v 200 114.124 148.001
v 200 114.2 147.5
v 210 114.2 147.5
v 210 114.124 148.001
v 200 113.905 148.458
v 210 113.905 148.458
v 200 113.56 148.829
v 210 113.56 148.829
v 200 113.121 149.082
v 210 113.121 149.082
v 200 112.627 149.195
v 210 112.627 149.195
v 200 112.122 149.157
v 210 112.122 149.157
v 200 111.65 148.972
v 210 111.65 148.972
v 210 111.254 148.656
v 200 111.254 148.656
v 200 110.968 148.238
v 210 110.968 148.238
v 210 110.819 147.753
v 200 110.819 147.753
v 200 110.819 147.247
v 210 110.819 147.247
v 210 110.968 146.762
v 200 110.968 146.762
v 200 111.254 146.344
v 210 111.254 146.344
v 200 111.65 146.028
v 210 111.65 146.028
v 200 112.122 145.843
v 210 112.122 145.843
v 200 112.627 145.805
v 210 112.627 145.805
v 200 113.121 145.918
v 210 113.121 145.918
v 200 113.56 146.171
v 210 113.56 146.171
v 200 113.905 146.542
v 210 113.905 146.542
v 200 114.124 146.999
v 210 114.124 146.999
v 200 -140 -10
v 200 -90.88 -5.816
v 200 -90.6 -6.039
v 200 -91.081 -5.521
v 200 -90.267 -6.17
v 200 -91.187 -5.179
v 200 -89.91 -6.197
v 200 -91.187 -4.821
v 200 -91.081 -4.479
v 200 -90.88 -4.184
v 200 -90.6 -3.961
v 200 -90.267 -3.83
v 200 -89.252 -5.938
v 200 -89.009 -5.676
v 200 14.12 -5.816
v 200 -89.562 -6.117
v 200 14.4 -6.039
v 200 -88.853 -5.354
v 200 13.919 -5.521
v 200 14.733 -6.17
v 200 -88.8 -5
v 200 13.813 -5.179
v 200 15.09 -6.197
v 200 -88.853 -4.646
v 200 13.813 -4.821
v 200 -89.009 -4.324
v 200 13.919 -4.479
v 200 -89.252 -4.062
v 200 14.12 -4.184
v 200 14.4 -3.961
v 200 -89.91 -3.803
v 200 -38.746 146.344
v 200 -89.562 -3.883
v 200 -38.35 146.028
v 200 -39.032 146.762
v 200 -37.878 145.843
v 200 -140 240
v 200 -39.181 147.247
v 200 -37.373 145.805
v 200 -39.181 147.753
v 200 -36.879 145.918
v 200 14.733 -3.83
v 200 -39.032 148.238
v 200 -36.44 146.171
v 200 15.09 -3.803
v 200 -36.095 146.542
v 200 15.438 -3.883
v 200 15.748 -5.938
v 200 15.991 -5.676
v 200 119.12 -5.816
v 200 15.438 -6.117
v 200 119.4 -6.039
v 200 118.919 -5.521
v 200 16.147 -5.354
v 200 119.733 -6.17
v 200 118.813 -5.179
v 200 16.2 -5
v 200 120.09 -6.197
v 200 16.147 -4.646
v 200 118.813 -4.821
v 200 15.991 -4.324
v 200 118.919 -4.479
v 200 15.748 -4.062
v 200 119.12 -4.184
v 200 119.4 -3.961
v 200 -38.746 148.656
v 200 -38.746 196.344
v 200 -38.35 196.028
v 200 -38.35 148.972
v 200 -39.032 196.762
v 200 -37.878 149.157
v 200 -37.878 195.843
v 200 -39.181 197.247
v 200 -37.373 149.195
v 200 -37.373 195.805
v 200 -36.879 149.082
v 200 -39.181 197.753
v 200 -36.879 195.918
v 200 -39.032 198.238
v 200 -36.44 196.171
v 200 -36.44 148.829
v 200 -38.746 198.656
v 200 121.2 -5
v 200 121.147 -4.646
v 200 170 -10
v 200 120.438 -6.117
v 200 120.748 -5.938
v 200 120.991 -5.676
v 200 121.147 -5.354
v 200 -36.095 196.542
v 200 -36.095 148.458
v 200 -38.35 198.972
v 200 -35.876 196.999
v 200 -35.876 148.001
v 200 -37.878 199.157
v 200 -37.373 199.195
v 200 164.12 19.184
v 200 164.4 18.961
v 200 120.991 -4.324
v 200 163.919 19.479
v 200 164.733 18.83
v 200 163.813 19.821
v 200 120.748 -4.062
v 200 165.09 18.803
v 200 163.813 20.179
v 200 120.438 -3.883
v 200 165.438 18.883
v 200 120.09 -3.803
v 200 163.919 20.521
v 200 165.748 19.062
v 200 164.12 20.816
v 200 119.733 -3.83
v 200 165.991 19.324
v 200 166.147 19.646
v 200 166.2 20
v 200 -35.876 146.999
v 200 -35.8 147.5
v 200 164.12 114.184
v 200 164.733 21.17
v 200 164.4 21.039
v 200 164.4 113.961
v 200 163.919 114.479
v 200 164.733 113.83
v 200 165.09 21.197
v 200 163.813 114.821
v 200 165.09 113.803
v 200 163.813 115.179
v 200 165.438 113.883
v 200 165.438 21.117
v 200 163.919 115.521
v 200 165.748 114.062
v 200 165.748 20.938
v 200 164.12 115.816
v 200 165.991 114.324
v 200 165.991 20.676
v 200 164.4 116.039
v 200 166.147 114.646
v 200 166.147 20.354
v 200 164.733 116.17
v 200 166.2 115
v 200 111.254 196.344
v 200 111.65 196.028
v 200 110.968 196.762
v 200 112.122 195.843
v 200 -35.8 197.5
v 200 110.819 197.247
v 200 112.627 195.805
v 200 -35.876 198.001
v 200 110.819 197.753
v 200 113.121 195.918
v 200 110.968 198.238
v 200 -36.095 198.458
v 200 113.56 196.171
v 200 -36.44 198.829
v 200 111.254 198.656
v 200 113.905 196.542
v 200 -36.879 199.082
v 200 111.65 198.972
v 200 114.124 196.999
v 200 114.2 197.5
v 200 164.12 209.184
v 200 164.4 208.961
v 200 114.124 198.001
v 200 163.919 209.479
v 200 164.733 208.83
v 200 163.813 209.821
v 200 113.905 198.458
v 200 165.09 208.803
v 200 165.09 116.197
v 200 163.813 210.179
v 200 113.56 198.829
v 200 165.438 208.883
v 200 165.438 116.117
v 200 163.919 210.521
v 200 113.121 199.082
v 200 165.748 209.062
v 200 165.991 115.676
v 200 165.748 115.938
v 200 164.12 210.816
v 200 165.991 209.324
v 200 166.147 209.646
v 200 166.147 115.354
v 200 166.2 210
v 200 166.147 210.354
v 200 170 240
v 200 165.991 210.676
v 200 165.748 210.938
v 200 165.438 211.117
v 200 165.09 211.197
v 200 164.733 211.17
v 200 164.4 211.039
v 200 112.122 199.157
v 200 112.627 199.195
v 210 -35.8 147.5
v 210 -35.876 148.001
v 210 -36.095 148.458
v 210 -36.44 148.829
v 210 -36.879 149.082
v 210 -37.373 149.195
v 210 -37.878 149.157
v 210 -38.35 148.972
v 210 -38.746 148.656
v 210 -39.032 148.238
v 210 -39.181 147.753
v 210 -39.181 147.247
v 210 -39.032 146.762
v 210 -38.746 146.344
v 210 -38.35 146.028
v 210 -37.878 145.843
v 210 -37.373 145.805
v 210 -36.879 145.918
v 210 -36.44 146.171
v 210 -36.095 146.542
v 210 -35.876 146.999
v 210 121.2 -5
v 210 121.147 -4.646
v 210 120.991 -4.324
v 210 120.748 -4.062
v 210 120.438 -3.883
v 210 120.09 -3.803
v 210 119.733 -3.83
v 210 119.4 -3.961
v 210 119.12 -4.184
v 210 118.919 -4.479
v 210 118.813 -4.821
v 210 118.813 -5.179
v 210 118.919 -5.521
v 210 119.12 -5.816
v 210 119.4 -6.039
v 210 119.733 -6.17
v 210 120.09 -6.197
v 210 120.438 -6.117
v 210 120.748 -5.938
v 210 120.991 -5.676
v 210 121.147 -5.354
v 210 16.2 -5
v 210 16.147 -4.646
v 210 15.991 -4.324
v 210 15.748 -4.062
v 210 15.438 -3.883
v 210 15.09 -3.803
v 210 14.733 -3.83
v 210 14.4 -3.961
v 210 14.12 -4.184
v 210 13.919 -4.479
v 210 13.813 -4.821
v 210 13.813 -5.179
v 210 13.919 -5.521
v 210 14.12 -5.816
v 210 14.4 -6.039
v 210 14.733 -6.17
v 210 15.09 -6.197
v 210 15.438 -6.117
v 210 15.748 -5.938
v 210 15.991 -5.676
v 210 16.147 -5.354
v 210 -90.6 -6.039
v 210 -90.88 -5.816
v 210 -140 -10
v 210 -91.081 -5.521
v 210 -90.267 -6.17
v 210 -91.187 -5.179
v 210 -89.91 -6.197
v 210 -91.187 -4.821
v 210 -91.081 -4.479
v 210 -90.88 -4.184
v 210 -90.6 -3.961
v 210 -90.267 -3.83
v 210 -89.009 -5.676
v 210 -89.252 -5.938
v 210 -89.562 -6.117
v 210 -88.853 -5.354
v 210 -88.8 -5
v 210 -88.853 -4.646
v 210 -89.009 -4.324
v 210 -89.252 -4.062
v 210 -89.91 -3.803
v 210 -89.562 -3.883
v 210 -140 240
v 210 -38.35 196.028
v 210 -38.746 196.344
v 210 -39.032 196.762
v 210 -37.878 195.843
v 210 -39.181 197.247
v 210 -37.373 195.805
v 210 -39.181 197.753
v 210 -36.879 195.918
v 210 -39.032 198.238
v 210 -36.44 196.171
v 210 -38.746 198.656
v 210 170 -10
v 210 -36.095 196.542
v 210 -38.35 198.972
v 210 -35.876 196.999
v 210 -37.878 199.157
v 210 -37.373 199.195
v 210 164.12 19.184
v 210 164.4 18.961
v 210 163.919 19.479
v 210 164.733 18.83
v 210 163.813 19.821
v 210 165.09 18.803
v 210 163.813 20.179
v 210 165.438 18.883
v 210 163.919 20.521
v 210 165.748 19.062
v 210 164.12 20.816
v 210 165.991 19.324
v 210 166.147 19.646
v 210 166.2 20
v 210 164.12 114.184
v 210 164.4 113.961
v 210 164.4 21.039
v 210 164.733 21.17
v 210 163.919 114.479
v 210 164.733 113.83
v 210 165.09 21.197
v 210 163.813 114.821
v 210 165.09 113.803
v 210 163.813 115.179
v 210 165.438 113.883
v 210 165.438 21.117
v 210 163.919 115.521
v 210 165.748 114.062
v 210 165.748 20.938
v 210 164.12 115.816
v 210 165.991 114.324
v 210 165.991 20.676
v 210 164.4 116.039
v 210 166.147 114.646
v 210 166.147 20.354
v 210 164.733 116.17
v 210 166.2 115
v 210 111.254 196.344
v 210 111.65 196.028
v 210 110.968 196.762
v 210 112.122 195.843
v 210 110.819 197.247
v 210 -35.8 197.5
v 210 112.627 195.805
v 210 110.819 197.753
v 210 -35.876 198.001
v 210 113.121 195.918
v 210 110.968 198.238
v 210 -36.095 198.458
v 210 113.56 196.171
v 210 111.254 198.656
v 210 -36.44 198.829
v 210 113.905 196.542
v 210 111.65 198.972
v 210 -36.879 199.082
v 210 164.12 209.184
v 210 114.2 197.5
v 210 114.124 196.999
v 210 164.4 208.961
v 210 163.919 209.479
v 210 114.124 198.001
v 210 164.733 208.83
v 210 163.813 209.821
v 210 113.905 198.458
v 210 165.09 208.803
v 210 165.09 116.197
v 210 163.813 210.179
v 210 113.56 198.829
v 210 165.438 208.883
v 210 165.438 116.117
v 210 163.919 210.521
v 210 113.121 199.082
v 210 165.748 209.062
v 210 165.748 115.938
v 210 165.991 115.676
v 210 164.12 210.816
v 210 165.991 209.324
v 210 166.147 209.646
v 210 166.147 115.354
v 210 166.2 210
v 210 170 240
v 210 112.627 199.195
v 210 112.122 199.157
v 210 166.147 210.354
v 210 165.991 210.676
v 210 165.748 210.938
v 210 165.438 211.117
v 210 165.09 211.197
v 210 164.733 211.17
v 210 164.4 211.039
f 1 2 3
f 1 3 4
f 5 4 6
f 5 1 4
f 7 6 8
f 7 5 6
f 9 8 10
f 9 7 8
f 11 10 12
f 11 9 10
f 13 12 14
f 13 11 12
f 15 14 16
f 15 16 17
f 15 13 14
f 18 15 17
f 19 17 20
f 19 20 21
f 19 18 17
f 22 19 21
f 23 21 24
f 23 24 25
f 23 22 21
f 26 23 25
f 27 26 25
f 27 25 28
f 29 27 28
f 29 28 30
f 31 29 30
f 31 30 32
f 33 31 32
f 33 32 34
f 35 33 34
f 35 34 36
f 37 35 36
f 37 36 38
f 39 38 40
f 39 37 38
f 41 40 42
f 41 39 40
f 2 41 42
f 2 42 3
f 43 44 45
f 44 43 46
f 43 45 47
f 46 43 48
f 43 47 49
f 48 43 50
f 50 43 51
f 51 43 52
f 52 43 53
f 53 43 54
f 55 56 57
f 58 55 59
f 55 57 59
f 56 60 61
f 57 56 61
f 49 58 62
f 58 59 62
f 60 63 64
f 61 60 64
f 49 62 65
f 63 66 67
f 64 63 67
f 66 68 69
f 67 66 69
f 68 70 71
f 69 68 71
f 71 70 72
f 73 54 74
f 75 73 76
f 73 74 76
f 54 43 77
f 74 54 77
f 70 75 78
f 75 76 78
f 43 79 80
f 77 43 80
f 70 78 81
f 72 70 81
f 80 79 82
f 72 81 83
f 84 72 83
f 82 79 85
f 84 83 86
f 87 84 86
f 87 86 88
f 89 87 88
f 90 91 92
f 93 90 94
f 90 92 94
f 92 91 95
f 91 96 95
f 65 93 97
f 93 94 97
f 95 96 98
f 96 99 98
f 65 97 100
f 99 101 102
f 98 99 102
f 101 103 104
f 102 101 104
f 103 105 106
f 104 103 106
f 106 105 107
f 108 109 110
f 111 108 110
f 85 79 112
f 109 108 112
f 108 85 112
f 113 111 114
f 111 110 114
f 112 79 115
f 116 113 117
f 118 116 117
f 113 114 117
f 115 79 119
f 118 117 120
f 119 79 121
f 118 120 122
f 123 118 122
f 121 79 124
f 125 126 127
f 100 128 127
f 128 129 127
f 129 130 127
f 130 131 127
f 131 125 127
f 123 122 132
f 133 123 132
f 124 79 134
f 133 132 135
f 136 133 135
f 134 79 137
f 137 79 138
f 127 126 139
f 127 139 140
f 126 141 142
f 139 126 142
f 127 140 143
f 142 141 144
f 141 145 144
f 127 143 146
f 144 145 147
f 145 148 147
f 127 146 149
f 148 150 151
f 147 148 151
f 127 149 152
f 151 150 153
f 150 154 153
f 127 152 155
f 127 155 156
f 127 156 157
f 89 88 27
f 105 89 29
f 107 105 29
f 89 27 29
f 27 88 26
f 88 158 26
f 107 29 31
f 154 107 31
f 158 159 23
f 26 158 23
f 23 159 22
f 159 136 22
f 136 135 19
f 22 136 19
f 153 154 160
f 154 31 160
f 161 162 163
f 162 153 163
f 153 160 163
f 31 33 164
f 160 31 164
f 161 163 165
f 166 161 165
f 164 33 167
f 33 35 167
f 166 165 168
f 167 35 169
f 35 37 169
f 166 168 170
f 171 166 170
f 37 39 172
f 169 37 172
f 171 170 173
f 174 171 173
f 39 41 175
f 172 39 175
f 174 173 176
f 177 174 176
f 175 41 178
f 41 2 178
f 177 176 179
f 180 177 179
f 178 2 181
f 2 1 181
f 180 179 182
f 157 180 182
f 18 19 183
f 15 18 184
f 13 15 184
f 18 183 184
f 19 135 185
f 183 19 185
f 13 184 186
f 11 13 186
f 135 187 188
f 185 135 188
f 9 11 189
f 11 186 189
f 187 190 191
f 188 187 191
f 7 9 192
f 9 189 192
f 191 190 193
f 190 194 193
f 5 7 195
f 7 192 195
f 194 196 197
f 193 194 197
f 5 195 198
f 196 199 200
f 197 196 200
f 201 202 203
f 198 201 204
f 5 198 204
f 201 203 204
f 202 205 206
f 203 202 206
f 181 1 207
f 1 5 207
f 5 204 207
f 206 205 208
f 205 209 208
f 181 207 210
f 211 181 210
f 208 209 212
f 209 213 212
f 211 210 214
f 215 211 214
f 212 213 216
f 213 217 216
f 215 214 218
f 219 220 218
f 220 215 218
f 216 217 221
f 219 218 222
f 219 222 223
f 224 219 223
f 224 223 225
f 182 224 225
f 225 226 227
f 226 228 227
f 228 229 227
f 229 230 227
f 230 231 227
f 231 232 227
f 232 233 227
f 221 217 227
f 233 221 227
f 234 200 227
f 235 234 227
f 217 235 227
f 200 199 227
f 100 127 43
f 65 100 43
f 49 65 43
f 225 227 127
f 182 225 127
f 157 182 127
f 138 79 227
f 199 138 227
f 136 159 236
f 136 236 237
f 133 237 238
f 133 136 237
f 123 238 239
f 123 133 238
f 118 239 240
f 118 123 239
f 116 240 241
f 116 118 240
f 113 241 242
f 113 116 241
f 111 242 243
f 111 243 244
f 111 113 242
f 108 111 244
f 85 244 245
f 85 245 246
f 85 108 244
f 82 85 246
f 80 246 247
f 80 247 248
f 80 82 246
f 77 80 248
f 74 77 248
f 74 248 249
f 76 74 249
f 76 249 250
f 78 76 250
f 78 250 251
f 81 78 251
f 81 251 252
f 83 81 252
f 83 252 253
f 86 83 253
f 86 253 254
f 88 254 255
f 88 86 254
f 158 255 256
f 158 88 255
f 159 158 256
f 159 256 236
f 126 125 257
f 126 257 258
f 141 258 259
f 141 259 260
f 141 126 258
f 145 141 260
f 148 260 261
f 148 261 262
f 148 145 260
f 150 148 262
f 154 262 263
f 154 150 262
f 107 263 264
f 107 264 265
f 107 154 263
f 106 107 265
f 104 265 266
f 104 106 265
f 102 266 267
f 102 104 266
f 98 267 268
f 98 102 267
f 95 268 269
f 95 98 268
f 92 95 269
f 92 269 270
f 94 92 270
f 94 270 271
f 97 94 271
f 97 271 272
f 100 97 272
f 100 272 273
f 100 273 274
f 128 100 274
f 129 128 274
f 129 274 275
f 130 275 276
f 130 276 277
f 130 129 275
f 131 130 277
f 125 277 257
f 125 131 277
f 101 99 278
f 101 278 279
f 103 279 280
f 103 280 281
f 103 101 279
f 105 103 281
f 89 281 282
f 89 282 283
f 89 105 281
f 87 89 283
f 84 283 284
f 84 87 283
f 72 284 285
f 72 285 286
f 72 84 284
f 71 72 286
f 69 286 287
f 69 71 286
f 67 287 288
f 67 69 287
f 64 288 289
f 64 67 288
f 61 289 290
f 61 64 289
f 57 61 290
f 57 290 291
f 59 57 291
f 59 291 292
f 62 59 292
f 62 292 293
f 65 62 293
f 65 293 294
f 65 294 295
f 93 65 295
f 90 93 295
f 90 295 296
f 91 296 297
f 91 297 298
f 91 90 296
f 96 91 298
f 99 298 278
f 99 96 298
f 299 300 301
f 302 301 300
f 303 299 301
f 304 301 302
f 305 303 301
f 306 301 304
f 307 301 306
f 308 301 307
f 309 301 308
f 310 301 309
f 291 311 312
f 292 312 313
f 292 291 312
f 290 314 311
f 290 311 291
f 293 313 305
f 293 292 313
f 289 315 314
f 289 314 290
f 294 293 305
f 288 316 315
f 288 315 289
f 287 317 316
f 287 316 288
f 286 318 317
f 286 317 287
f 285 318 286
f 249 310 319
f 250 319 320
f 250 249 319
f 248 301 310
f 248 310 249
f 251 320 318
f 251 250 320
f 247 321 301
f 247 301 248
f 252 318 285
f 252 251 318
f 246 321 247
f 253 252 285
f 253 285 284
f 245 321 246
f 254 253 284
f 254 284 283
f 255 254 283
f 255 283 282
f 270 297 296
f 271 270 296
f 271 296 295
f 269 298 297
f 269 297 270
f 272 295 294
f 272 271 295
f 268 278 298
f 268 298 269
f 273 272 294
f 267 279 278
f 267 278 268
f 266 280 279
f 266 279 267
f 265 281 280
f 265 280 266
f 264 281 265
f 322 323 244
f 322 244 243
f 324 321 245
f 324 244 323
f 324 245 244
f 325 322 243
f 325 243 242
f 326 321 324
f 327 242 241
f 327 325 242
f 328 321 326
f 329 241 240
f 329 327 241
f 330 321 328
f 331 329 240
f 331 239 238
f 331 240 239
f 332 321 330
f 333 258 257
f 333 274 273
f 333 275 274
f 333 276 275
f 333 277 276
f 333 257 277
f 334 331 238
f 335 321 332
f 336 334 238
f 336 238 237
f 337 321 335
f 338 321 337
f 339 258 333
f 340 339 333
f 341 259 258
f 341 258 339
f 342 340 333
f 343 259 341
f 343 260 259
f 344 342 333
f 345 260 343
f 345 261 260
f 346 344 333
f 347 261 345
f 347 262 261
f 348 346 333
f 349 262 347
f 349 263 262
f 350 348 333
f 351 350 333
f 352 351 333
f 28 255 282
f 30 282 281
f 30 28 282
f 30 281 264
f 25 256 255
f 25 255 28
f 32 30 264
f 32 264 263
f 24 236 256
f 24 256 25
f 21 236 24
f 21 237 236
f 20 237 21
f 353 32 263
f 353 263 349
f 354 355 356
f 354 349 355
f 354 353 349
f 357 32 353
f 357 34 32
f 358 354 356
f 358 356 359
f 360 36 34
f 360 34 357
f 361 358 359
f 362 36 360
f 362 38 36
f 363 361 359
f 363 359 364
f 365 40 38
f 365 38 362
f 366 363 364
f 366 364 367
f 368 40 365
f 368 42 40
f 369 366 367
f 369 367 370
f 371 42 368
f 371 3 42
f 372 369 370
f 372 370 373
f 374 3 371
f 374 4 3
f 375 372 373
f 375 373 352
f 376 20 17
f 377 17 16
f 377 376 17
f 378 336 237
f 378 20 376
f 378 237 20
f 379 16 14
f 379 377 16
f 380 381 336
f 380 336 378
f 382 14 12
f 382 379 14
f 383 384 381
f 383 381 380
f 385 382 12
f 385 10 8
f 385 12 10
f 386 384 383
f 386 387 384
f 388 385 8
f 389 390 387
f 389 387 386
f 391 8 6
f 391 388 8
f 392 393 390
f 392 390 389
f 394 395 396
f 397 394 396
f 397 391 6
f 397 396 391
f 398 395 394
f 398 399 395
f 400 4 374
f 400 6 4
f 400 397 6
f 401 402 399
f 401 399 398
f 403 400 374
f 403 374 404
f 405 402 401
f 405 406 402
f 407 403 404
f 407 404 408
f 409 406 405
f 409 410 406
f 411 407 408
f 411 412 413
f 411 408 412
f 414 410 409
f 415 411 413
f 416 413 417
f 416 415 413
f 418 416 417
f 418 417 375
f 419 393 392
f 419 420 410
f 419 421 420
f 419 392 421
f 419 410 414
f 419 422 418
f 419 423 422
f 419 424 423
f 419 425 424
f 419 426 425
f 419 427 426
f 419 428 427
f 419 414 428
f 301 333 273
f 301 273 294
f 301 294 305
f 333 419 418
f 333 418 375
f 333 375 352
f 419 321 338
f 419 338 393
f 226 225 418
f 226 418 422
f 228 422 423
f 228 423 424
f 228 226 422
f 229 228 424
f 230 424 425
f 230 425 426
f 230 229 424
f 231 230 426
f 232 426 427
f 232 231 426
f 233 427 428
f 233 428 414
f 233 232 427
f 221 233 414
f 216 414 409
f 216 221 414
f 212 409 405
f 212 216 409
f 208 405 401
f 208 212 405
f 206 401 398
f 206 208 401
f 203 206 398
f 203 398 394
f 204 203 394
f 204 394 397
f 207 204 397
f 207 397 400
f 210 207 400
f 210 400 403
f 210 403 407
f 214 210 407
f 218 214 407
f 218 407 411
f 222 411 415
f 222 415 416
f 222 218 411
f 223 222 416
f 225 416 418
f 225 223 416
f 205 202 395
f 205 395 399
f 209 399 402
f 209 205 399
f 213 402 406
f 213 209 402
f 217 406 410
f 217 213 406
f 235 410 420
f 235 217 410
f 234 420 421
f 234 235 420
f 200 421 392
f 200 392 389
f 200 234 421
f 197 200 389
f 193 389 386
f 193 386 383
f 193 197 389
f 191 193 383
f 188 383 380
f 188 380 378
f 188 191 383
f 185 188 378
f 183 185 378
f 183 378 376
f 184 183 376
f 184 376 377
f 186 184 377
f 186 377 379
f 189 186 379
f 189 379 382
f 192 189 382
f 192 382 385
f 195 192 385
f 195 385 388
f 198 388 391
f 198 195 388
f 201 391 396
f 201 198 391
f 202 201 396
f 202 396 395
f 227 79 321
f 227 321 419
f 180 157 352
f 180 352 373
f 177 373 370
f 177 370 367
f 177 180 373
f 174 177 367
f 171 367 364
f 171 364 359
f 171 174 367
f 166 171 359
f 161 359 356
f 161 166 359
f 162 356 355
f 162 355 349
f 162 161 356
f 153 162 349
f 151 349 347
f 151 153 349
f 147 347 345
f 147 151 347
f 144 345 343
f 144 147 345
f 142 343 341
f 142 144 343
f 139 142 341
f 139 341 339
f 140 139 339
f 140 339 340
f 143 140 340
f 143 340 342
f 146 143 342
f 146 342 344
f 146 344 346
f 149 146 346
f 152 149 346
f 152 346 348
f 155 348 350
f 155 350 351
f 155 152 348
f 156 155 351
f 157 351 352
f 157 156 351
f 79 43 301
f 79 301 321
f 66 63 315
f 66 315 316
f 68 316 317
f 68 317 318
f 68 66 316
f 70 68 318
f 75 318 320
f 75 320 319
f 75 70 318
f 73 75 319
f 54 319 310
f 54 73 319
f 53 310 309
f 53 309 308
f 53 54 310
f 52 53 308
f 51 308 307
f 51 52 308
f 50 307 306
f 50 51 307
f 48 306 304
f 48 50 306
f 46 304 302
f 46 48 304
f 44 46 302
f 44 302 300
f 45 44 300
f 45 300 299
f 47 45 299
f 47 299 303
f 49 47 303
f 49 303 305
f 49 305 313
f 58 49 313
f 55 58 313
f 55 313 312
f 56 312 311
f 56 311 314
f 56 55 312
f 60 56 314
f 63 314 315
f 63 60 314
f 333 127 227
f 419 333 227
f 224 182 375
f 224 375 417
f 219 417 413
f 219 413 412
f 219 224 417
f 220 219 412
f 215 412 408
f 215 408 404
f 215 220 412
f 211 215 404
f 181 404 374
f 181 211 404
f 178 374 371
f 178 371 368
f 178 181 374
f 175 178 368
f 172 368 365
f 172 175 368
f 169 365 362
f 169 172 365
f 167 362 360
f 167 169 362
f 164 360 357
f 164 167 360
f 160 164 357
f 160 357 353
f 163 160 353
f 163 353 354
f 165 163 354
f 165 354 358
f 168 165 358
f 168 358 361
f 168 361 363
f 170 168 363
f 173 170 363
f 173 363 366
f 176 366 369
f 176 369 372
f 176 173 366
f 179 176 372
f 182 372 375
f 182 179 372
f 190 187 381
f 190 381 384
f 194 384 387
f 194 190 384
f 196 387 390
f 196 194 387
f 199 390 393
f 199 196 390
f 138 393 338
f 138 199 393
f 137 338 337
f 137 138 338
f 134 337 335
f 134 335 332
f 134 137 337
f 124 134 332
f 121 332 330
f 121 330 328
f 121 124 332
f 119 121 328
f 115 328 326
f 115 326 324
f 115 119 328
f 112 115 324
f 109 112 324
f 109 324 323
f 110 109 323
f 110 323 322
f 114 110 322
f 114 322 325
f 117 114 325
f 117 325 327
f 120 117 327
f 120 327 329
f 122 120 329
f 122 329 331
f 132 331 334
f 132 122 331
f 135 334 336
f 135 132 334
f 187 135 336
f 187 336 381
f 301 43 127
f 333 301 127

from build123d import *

# Parameters (mm, degrees)
CYLINDER009_R           = 1.7
CYLINDER009_DEPTH       = 20
CYLINDER005_R           = 1.7
CYLINDER005_DEPTH       = 61
CYLINDER005_PITCH_ANGLE = 90
CYLINDER004_R           = 1.7
CYLINDER004_DEPTH       = 61
CYLINDER004_PITCH_ANGLE = 90
CYLINDER002_R           = 1.7
CYLINDER002_DEPTH       = 61
CYLINDER002_PITCH_ANGLE = 90
BOX_W                   = 50
BOX_H                   = 215
BOX_DEPTH               = 115
CYLINDER006_R           = 1.7
CYLINDER006_DEPTH       = 61
CYLINDER006_PITCH_ANGLE = 90
SKETCH005_W             = 310
SKETCH005_H             = 250
SKETCH005_R             = 1.2
SKETCH005_R_2           = 1.7
PAD005_DEPTH            = 10
CYLINDER008_R           = 1.7
CYLINDER008_DEPTH       = 20
CYLINDER010_R           = 1.7
CYLINDER010_DEPTH       = 20
CYLINDER010_ROLL_ANGLE  = 90
CYLINDER011_R           = 1.7
CYLINDER011_DEPTH       = 20
CYLINDER011_ROLL_ANGLE  = 90
CYLINDER012_R           = 1.7
CYLINDER012_DEPTH       = 20
CYLINDER012_ROLL_ANGLE  = 90
CYLINDER007_R           = 1.7
CYLINDER007_DEPTH       = 20


with BuildPart() as cylinder009:
    # Cylinder009 → Cylinder009 (new body)
    with BuildSketch(Plane(origin=(205, 120, 235), x_dir=(1, 0, 0), z_dir=(0, 0, 1))):
        Circle(CYLINDER009_R)
    extrude(amount=CYLINDER009_DEPTH)


with BuildPart() as cylinder005:
    # Cylinder005 → Cylinder005 (new body)
    with BuildSketch(Plane.XY):
        Circle(CYLINDER005_R)
    extrude(amount=CYLINDER005_DEPTH)


with BuildPart() as cylinder005_1:
    # Cylinder005 pitch: moved
    add(cylinder005.part.rotate(Axis((0, 0, 0), (0, 1, 0)), CYLINDER005_PITCH_ANGLE))


with BuildPart() as cylinder005_2:
    # Cylinder005 placement: moved
    add(cylinder005_1.part.moved(Location((150, 112.5, 147.5))))


with BuildPart() as cylinder004:
    # Cylinder004 → Cylinder004 (new body)
    with BuildSketch(Plane.XY):
        Circle(CYLINDER004_R)
    extrude(amount=CYLINDER004_DEPTH)


with BuildPart() as cylinder004_1:
    # Cylinder004 pitch: moved
    add(cylinder004.part.rotate(Axis((0, 0, 0), (0, 1, 0)), CYLINDER004_PITCH_ANGLE))


with BuildPart() as cylinder004_2:
    # Cylinder004 placement: moved
    add(cylinder004_1.part.moved(Location((150, -37.5, 197.5))))


with BuildPart() as cylinder002:
    # Cylinder002 → Cylinder002 (new body)
    with BuildSketch(Plane.XY):
        Circle(CYLINDER002_R)
    extrude(amount=CYLINDER002_DEPTH)


with BuildPart() as cylinder002_1:
    # Cylinder002 pitch: moved
    add(cylinder002.part.rotate(Axis((0, 0, 0), (0, 1, 0)), CYLINDER002_PITCH_ANGLE))


with BuildPart() as cylinder002_2:
    # Cylinder002 placement: moved
    add(cylinder002_1.part.moved(Location((150, -37.5, 147.5))))


with BuildPart() as box:
    # Box → Box (new body)
    with BuildSketch(Plane(origin=(150, -70, 115), x_dir=(1, 0, 0), z_dir=(0, 0, 1))):
        with Locations((25, 107.5)):
            Rectangle(BOX_W, BOX_H)
    extrude(amount=BOX_DEPTH)


with BuildPart() as fusion002:
    # Cylinder006 → Cylinder006 (new body)
    with BuildSketch(Plane.XY):
        Circle(CYLINDER006_R)
    extrude(amount=CYLINDER006_DEPTH)


with BuildPart() as fusion002_1:
    # Cylinder006 pitch: moved
    add(fusion002.part.rotate(Axis((0, 0, 0), (0, 1, 0)), CYLINDER006_PITCH_ANGLE))


with BuildPart() as fusion002_2:
    # Cylinder006 placement: moved
    add(fusion002_1.part.moved(Location((150, 112.5, 197.5))))

    # Fusion002: union Cylinder005, Cylinder004, Cylinder002, Box
    add(cylinder005_2.part)
    add(cylinder004_2.part)
    add(cylinder002_2.part)
    add(box.part)


with BuildPart() as cut002:
    # Sketch005 → Pad005 (new body)
    with BuildSketch(Plane.YZ.offset(200)):
        with Locations((15, 115)):
            Rectangle(SKETCH005_W, SKETCH005_H)
        with Locations((165, 210)):
            Circle(SKETCH005_R, mode=Mode.SUBTRACT)
        with Locations((165, 115)):
            Circle(SKETCH005_R, mode=Mode.SUBTRACT)
        with Locations((165, 20)):
            Circle(SKETCH005_R, mode=Mode.SUBTRACT)
        with Locations((120, -5)):
            Circle(SKETCH005_R, mode=Mode.SUBTRACT)
        with Locations((15, -5)):
            Circle(SKETCH005_R, mode=Mode.SUBTRACT)
        with Locations((-90, -5)):
            Circle(SKETCH005_R, mode=Mode.SUBTRACT)
        with Locations((-37.5, 197.5)):
            Circle(SKETCH005_R_2, mode=Mode.SUBTRACT)
        with Locations((-37.5, 147.5)):
            Circle(SKETCH005_R_2, mode=Mode.SUBTRACT)
        with Locations((112.5, 147.5)):
            Circle(SKETCH005_R_2, mode=Mode.SUBTRACT)
        with Locations((112.5, 197.5)):
            Circle(SKETCH005_R_2, mode=Mode.SUBTRACT)
    extrude(amount=PAD005_DEPTH)

    # Cut002: cut Fusion002
    add(fusion002_2.part, mode=Mode.SUBTRACT)


with BuildPart() as cut007:
    # Cut007 base: copy of Cut002
    add(cut002.part)

    # Cut007: cut Cylinder009
    add(cylinder009.part, mode=Mode.SUBTRACT)


with BuildPart() as cylinder008:
    # Cylinder008 → Cylinder008 (new body)
    with BuildSketch(Plane(origin=(205, 15, 235), x_dir=(1, 0, 0), z_dir=(0, 0, 1))):
        Circle(CYLINDER008_R)
    extrude(amount=CYLINDER008_DEPTH)


with BuildPart() as cut006:
    # Cut006 base: copy of Cut002
    add(cut002.part)

    # Cut006: cut Cylinder008
    add(cylinder008.part, mode=Mode.SUBTRACT)


with BuildPart() as cylinder010:
    # Cylinder010 → Cylinder010 (new body)
    with BuildSketch(Plane.XY):
        Circle(CYLINDER010_R)
    extrude(amount=CYLINDER010_DEPTH)


with BuildPart() as cylinder010_1:
    # Cylinder010 roll: moved
    add(cylinder010.part.rotate(Axis((0, 0, 0), (1, 0, 0)), CYLINDER010_ROLL_ANGLE))


with BuildPart() as cylinder010_2:
    # Cylinder010 placement: moved
    add(cylinder010_1.part.moved(Location((205, -135, 20))))


with BuildPart() as cut008:
    # Cut008 base: copy of Cut002
    add(cut002.part)

    # Cut008: cut Cylinder010
    add(cylinder010_2.part, mode=Mode.SUBTRACT)


with BuildPart() as cylinder011:
    # Cylinder011 → Cylinder011 (new body)
    with BuildSketch(Plane.XY):
        Circle(CYLINDER011_R)
    extrude(amount=CYLINDER011_DEPTH)


with BuildPart() as cylinder011_1:
    # Cylinder011 roll: moved
    add(cylinder011.part.rotate(Axis((0, 0, 0), (1, 0, 0)), CYLINDER011_ROLL_ANGLE))


with BuildPart() as cylinder011_2:
    # Cylinder011 placement: moved
    add(cylinder011_1.part.moved(Location((205, -135, 115))))


with BuildPart() as cut009:
    # Cut009 base: copy of Cut002
    add(cut002.part)

    # Cut009: cut Cylinder011
    add(cylinder011_2.part, mode=Mode.SUBTRACT)


with BuildPart() as cylinder012:
    # Cylinder012 → Cylinder012 (new body)
    with BuildSketch(Plane.XY):
        Circle(CYLINDER012_R)
    extrude(amount=CYLINDER012_DEPTH)


with BuildPart() as cylinder012_1:
    # Cylinder012 roll: moved
    add(cylinder012.part.rotate(Axis((0, 0, 0), (1, 0, 0)), CYLINDER012_ROLL_ANGLE))


with BuildPart() as cylinder012_2:
    # Cylinder012 placement: moved
    add(cylinder012_1.part.moved(Location((205, -135, 210))))


with BuildPart() as ok:
    # Cut010 base: copy of Cut002
    add(cut002.part)

    # Cut010: cut Cylinder012
    add(cylinder012_2.part, mode=Mode.SUBTRACT)


with BuildPart() as cylinder007:
    # Cylinder007 → Cylinder007 (new body)
    with BuildSketch(Plane(origin=(205, -90, 235), x_dir=(1, 0, 0), z_dir=(0, 0, 1))):
        Circle(CYLINDER007_R)
    extrude(amount=CYLINDER007_DEPTH)


with BuildPart() as fusion003:
    # Cut005 base: copy of Cut002
    add(cut002.part)

    # Cut005: cut Cylinder007
    add(cylinder007.part, mode=Mode.SUBTRACT)

    # Fusion003: union Cut007, Cut006, Cut008, Cut009, ok
    add(cut007.part)
    add(cut006.part)
    add(cut008.part)
    add(cut009.part)
    add(ok.part)


solid = fusion003.part
